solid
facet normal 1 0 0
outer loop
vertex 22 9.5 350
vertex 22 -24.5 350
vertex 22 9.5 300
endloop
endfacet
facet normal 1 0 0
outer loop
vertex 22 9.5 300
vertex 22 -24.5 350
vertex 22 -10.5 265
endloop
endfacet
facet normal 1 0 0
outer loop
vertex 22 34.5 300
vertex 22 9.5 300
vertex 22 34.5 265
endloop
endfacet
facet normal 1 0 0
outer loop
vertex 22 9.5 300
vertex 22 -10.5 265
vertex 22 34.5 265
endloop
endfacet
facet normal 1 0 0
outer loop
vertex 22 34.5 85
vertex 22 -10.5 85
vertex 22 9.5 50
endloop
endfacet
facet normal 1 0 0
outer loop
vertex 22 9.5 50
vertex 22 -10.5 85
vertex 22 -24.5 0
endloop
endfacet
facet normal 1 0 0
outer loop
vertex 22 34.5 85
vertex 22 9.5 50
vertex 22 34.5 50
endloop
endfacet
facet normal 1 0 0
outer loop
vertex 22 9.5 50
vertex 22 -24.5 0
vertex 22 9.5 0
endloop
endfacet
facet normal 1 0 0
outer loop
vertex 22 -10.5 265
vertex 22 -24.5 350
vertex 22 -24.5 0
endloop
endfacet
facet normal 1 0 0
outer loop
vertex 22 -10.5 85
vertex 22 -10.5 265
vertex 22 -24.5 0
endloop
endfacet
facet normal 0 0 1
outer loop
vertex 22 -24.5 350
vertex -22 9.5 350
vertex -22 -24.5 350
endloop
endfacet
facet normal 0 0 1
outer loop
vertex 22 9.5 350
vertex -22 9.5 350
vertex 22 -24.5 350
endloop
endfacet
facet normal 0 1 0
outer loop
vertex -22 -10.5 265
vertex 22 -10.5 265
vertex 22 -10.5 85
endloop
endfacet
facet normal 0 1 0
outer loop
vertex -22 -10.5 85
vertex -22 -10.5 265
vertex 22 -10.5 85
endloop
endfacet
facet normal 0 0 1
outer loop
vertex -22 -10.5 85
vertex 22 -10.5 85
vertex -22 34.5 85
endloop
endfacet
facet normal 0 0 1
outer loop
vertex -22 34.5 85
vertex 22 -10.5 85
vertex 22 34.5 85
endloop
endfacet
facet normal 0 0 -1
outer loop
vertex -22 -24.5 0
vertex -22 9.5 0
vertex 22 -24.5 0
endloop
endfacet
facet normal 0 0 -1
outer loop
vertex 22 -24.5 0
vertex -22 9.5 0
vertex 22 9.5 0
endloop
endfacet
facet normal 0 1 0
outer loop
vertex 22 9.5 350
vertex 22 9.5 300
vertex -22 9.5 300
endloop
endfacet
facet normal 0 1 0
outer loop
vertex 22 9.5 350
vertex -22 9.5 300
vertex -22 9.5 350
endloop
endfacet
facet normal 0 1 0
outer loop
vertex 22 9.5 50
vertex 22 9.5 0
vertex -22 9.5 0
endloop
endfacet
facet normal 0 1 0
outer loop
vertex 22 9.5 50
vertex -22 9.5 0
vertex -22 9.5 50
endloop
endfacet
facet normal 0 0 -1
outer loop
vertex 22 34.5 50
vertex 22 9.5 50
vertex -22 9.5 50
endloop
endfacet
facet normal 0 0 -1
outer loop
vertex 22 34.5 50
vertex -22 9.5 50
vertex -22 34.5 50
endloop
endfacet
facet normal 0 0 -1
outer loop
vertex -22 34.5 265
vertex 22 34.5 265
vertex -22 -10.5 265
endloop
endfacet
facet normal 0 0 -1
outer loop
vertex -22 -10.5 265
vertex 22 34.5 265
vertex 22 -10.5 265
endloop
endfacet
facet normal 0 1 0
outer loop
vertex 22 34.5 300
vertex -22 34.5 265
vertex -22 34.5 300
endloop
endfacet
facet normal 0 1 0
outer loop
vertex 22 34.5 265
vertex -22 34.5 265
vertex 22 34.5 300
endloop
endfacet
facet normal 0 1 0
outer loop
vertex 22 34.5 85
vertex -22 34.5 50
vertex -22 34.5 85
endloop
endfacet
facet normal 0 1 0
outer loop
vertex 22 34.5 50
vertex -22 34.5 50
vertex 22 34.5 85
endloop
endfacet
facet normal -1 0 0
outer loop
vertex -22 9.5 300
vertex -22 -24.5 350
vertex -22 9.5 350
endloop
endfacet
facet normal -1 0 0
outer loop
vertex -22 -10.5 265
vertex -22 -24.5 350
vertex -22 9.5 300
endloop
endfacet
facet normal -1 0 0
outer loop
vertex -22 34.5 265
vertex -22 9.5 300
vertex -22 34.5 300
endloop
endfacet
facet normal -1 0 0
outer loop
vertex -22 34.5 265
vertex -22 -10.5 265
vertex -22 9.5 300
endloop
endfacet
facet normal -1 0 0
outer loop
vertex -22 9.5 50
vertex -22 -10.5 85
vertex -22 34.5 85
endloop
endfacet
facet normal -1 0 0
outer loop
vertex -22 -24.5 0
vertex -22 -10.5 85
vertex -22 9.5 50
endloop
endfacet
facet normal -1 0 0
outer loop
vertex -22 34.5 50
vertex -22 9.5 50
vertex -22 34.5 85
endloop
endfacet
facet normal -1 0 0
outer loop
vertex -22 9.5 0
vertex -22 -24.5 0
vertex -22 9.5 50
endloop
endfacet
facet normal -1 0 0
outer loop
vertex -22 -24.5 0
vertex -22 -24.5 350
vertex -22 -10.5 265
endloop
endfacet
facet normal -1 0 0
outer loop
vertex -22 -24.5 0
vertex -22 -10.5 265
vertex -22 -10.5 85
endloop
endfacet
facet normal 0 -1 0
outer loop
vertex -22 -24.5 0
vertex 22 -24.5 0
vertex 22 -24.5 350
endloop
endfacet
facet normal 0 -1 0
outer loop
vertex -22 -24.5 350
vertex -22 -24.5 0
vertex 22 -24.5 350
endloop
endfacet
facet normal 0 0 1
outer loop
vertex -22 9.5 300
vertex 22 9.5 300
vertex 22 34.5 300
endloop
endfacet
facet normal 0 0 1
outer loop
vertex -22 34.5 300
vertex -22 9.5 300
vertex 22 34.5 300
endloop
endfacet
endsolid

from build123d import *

# Parameters (mm, degrees)
F0_W     = 44
F0_H     = 69
F1_DEPTH = 350
F2_W     = 25
F2_H     = 50
F3_DEPTH = 44.001
F4_W     = 10
F4_H     = 350
F5_DEPTH = 100


with BuildPart() as f1:
    # F0 (on Top) → F1 (new body)
    with BuildSketch(Plane.XY):
        Rectangle(F0_W, F0_H)
    extrude(amount=F1_DEPTH)

    # F2 (on face) → F3 (cut, through all)
    with BuildSketch(Plane.YZ.offset(22)):
        Polygon((-10.5, 85), (34.5, 85), (34.5, 175), (34.5, 265), (-10.5, 265), (-10.5, 175), align=None)
        with Locations((22, 25)):
            Rectangle(F2_W, F2_H)
        with Locations((22, 325)):
            Rectangle(F2_W, F2_H)
    extrude(amount=-F3_DEPTH, mode=Mode.SUBTRACT)

    # F4 (on face) → F5 (cut)
    with BuildSketch(Plane.YZ.offset(22)):
        with Locations((-29.5, 175)):
            Rectangle(F4_W, F4_H)
    extrude(amount=-F5_DEPTH, mode=Mode.SUBTRACT)


solid = f1.part
